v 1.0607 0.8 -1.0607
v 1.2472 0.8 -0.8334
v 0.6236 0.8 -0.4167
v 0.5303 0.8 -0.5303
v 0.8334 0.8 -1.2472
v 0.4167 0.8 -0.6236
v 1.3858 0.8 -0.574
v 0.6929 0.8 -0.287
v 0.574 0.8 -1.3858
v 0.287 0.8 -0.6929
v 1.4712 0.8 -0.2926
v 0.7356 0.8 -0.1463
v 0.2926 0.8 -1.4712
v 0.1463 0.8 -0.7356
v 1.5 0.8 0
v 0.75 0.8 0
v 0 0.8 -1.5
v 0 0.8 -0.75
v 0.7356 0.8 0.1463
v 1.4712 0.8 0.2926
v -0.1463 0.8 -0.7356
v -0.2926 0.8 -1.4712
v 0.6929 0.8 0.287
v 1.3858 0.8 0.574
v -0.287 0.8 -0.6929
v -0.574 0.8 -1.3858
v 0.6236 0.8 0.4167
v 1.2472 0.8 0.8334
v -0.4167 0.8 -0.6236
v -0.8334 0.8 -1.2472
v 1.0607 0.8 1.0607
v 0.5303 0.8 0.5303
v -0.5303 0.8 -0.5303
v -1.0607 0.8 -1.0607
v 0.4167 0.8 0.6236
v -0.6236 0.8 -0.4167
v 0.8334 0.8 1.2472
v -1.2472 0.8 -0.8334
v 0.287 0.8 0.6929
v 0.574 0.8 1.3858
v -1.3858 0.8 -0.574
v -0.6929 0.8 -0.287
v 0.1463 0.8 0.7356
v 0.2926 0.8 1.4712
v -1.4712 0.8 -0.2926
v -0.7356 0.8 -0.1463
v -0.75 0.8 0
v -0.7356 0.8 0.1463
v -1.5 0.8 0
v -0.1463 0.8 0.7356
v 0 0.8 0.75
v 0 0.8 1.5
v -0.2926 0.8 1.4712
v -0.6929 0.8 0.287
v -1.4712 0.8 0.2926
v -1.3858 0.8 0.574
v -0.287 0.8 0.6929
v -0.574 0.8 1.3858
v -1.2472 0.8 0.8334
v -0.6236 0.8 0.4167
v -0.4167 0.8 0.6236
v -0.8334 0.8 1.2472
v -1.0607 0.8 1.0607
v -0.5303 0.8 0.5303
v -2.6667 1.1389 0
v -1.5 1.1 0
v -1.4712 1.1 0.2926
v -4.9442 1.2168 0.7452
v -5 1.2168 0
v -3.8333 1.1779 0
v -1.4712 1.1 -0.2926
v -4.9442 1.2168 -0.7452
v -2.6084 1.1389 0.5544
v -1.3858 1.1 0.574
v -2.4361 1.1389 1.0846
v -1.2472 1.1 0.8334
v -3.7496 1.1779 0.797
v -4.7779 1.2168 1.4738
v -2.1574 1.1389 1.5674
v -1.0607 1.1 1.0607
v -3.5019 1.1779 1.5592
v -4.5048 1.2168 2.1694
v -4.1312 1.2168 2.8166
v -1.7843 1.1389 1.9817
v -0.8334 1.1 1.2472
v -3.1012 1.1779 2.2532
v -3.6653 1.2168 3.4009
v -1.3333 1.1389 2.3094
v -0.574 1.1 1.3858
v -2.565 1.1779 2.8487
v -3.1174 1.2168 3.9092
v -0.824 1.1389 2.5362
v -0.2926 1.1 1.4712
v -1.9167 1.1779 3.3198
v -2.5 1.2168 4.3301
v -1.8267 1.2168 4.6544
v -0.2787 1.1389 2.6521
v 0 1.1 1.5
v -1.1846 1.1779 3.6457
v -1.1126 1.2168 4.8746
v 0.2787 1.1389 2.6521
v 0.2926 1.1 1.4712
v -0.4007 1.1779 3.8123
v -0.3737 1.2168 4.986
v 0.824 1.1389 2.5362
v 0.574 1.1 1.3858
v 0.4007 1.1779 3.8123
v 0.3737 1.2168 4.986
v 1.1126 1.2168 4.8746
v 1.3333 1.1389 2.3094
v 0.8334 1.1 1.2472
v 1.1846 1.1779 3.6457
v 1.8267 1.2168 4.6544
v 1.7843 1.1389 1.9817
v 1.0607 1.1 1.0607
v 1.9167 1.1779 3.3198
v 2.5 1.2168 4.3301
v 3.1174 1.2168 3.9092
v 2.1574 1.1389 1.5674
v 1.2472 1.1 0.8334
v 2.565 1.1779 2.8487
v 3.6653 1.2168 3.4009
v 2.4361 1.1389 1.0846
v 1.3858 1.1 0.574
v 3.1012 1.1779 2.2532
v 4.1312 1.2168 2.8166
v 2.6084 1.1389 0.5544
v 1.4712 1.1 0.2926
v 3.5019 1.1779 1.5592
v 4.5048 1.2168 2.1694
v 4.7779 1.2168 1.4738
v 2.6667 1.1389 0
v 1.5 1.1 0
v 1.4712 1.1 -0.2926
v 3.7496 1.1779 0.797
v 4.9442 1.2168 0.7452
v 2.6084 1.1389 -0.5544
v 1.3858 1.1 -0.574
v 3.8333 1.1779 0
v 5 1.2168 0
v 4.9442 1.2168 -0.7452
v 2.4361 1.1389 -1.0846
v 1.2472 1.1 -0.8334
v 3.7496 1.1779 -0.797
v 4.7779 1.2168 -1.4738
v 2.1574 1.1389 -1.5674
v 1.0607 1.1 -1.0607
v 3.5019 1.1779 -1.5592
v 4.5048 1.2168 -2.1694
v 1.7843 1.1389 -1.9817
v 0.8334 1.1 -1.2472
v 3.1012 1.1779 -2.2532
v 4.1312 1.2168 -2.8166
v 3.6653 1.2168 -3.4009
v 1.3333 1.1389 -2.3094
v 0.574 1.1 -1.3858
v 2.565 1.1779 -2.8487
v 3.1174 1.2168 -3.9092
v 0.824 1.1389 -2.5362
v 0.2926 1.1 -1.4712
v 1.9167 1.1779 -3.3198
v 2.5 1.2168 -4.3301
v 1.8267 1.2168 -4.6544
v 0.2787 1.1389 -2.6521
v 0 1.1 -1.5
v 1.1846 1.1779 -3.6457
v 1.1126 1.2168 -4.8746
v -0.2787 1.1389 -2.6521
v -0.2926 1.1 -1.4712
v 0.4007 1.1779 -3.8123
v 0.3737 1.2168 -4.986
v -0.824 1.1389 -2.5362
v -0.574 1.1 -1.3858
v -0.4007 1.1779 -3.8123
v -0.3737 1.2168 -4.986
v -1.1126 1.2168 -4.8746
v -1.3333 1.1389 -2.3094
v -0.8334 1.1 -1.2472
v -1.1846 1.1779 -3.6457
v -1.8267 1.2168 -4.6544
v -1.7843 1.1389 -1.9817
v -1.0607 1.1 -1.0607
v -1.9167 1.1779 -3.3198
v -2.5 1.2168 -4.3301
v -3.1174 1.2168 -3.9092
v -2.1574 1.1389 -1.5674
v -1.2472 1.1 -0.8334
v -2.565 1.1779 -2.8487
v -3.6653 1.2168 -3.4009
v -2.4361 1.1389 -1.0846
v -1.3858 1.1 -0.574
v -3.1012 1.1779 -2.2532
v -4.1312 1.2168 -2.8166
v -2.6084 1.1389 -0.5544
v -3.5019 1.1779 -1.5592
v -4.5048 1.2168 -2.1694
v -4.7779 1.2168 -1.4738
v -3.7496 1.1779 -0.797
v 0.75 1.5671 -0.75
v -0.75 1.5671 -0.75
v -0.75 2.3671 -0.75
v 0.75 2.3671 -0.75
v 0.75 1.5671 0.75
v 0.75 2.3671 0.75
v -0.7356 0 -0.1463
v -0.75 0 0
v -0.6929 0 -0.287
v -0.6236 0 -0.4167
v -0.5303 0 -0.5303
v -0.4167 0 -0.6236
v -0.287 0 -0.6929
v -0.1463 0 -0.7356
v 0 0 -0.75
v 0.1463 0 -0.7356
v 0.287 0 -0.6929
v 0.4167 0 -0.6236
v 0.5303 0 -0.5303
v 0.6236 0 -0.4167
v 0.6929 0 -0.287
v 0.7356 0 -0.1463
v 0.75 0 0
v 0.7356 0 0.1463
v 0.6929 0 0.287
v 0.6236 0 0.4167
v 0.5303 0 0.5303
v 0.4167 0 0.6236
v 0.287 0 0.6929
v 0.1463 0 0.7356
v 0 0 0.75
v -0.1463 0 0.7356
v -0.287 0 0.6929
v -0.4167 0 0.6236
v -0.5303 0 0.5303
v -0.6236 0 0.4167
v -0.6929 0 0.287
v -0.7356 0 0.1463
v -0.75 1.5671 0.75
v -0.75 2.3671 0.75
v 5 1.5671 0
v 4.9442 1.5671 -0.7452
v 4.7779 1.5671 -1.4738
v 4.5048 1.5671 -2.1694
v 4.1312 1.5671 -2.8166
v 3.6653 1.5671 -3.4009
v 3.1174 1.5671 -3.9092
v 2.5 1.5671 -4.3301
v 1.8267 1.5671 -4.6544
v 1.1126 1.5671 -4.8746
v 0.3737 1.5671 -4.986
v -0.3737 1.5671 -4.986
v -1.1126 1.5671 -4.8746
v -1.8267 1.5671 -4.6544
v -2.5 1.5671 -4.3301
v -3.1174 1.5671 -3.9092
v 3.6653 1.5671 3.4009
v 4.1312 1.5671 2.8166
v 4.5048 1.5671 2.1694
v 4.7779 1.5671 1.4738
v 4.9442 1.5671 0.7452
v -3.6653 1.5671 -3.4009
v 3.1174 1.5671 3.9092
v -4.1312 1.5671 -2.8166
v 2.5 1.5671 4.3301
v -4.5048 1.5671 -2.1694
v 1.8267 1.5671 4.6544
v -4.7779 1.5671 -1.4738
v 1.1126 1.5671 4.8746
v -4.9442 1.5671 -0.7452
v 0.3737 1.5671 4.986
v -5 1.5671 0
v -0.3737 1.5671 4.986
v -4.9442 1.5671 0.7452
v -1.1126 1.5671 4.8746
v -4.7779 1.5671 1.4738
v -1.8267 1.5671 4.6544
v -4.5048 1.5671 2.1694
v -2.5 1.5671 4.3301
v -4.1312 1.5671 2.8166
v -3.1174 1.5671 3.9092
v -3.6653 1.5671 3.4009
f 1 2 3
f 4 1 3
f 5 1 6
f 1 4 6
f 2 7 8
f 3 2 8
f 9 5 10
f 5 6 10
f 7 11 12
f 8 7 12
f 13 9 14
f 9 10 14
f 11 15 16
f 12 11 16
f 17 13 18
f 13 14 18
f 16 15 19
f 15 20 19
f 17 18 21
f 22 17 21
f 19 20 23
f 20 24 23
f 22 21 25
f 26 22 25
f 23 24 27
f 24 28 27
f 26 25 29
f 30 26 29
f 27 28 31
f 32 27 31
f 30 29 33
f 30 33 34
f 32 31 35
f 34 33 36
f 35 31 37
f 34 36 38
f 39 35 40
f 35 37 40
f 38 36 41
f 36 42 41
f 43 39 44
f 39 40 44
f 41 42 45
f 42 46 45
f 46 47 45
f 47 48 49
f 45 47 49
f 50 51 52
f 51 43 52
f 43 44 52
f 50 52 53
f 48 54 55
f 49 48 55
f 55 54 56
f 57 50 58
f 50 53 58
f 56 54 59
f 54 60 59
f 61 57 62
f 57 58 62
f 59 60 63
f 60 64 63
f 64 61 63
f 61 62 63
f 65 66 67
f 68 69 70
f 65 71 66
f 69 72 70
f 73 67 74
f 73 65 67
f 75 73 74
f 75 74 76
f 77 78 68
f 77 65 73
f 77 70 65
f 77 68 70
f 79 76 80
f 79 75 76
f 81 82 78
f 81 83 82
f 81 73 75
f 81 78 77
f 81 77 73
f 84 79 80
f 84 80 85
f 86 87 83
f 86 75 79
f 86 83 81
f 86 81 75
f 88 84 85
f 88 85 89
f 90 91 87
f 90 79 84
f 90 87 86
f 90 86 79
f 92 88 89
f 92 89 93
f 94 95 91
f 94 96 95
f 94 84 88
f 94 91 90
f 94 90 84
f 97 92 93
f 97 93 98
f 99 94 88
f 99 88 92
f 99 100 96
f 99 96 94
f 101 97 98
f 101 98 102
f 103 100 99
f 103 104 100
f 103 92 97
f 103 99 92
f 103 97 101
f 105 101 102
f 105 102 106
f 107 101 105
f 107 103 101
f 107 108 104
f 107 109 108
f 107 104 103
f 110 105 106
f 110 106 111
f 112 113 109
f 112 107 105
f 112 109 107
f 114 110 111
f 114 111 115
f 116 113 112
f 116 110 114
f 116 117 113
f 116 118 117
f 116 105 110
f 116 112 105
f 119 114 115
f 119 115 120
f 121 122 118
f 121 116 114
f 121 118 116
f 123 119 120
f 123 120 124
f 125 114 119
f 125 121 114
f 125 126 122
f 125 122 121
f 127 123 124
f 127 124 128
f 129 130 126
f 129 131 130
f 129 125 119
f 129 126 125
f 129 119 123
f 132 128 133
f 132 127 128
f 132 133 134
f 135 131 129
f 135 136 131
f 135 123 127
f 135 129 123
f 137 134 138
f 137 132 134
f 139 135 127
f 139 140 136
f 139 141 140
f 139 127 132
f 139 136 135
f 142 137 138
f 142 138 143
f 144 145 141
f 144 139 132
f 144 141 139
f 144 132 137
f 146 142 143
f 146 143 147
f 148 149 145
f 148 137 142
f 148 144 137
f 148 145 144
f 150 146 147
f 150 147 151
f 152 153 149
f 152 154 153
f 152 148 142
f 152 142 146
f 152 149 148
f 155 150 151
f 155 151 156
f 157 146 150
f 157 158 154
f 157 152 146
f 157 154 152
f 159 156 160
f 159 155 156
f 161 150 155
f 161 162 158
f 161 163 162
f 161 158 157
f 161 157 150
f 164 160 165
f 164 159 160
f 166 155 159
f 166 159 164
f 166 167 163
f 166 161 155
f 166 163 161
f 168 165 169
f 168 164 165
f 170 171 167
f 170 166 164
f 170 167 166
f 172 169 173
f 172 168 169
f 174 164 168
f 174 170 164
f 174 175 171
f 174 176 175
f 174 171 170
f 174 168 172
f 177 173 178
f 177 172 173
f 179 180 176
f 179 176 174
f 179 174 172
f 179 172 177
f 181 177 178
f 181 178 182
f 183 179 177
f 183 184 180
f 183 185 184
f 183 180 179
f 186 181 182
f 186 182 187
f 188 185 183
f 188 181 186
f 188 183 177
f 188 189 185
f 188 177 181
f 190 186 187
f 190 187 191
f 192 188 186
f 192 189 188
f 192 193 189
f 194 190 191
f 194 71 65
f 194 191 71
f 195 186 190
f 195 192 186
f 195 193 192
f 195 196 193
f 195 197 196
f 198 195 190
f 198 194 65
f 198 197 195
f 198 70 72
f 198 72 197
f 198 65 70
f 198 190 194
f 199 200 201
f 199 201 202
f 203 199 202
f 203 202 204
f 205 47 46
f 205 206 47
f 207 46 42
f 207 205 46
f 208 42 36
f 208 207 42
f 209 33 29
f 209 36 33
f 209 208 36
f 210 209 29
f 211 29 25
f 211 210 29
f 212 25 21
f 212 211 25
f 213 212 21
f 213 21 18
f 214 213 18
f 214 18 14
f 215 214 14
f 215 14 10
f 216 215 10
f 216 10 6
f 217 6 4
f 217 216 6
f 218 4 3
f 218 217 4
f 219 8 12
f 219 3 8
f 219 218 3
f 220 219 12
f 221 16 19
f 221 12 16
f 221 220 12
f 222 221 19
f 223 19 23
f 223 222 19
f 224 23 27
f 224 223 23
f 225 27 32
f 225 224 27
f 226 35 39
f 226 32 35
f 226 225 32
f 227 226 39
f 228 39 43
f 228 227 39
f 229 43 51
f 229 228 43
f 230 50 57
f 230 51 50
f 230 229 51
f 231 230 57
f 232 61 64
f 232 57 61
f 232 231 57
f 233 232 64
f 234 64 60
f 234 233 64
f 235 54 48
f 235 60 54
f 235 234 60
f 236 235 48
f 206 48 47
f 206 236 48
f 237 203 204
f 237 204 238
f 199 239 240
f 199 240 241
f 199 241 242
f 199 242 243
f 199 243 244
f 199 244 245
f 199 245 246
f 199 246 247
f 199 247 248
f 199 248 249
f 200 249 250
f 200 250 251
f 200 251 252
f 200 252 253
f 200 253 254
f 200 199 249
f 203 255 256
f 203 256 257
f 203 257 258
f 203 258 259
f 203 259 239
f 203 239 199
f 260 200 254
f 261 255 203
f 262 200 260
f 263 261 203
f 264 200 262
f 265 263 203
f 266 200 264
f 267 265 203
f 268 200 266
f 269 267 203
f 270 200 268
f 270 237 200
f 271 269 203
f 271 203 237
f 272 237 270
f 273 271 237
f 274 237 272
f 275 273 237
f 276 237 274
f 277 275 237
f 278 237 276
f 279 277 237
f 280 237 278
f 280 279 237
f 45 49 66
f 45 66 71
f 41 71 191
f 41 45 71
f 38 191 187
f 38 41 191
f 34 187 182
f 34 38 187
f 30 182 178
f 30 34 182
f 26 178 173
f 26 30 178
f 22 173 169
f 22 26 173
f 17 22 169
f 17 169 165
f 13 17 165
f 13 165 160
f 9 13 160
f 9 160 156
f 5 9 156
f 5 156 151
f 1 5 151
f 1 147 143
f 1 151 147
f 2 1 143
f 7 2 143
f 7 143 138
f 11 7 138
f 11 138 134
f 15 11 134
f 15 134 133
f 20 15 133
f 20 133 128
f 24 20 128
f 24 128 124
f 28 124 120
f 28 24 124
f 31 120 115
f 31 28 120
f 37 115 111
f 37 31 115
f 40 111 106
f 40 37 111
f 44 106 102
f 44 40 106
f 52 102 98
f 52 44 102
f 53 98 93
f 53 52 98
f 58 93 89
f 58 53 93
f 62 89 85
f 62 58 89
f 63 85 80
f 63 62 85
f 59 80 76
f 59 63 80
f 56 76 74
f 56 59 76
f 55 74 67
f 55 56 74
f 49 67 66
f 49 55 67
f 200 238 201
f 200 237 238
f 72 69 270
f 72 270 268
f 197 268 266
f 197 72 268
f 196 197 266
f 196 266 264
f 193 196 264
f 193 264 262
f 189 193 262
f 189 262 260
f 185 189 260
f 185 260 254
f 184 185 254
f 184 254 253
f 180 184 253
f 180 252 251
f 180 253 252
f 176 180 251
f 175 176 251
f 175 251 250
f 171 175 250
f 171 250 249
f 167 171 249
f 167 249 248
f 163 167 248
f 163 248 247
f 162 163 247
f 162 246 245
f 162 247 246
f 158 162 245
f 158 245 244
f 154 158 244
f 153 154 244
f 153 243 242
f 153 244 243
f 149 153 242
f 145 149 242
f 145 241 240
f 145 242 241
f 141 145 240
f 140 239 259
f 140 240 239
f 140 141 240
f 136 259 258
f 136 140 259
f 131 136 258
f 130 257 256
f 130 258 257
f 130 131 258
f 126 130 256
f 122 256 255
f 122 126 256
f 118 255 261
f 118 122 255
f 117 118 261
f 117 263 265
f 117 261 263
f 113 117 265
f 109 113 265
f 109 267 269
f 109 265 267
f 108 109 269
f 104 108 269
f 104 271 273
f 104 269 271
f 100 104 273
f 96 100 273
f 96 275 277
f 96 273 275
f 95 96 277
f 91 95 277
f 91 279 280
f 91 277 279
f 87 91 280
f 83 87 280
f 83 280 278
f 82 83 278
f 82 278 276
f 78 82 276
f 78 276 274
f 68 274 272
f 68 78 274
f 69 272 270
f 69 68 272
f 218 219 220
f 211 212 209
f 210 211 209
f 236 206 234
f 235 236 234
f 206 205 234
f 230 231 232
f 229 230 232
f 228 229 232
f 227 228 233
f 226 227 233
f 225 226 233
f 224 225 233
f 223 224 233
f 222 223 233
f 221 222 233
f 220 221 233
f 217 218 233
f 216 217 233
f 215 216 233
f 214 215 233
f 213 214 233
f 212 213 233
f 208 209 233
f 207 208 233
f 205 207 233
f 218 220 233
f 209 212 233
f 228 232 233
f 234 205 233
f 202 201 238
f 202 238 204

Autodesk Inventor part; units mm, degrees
ref_plane "YZ Plane" through (0, 0, 0) normal (1, 0, 0) x (0, 1, 0)
ref_plane "XZ Plane" through (0, 0, 0) normal (0, 1, 0) x (-1, 0, 0)
ref_plane "XY Plane" through (0, 0, 0) normal (0, 0, 1) x (1, 0, 0)
sketch "Boceto1" plane through (0, 0, 0) normal (0, 0, 1) x (1, 0, 0)
  line L0 (0, 1.5671) -> (-5, 1.5671)
  line L1 (-5, 1.5671) -> (-5, 1.2168)
  line L2 (-1.5, 1.1) -> (-5, 1.2168)
  line L3 (-1.5, 1.1) -> (-1.5, 0.8)
  line L4 (-1.5, 0.8) -> (-0.75, 0.8)
  line L5 (-0.75, 0.8) -> (-0.75, 0)
  line L6 (-0.75, 0) -> (0, 0)
  line L7 (0, 0) -> (0, 1.5671)
revolve "Revolución1" add sketch "Boceto1" angle 360 about axis through (0, 0, 0) along (0, 1, 0)
sketch "Boceto2" plane through (0, 1.5671, 0) normal (0, 1, 0) x (1, 0, 0)
  line L0 (0, 0) -> (-0.75, 0)
  circle A0 centre (0, 0) radius 0.75 projected
  line L1 (-0.75, 0) -> (-0.75, 0.75)
  line L2 (-0.75, 0.75) -> (0.75, 0.75)
  line L3 (0.75, 0.75) -> (0.75, -0.75)
  line L4 (0.75, -0.75) -> (-0.75, -0.75)
  line L5 (-0.75, -0.75) -> (-0.75, 0)
  dimension "d1" = 0.75
  dimension "d2" = 0.75
  dimension "d3" = 1.5
  dimension "d4" = 1.5
  dimension "d5" = 1.5
extrude "Extrusión1" add sketch "Boceto2" along normal blind 0.8
properties part number "enlacecuello"
